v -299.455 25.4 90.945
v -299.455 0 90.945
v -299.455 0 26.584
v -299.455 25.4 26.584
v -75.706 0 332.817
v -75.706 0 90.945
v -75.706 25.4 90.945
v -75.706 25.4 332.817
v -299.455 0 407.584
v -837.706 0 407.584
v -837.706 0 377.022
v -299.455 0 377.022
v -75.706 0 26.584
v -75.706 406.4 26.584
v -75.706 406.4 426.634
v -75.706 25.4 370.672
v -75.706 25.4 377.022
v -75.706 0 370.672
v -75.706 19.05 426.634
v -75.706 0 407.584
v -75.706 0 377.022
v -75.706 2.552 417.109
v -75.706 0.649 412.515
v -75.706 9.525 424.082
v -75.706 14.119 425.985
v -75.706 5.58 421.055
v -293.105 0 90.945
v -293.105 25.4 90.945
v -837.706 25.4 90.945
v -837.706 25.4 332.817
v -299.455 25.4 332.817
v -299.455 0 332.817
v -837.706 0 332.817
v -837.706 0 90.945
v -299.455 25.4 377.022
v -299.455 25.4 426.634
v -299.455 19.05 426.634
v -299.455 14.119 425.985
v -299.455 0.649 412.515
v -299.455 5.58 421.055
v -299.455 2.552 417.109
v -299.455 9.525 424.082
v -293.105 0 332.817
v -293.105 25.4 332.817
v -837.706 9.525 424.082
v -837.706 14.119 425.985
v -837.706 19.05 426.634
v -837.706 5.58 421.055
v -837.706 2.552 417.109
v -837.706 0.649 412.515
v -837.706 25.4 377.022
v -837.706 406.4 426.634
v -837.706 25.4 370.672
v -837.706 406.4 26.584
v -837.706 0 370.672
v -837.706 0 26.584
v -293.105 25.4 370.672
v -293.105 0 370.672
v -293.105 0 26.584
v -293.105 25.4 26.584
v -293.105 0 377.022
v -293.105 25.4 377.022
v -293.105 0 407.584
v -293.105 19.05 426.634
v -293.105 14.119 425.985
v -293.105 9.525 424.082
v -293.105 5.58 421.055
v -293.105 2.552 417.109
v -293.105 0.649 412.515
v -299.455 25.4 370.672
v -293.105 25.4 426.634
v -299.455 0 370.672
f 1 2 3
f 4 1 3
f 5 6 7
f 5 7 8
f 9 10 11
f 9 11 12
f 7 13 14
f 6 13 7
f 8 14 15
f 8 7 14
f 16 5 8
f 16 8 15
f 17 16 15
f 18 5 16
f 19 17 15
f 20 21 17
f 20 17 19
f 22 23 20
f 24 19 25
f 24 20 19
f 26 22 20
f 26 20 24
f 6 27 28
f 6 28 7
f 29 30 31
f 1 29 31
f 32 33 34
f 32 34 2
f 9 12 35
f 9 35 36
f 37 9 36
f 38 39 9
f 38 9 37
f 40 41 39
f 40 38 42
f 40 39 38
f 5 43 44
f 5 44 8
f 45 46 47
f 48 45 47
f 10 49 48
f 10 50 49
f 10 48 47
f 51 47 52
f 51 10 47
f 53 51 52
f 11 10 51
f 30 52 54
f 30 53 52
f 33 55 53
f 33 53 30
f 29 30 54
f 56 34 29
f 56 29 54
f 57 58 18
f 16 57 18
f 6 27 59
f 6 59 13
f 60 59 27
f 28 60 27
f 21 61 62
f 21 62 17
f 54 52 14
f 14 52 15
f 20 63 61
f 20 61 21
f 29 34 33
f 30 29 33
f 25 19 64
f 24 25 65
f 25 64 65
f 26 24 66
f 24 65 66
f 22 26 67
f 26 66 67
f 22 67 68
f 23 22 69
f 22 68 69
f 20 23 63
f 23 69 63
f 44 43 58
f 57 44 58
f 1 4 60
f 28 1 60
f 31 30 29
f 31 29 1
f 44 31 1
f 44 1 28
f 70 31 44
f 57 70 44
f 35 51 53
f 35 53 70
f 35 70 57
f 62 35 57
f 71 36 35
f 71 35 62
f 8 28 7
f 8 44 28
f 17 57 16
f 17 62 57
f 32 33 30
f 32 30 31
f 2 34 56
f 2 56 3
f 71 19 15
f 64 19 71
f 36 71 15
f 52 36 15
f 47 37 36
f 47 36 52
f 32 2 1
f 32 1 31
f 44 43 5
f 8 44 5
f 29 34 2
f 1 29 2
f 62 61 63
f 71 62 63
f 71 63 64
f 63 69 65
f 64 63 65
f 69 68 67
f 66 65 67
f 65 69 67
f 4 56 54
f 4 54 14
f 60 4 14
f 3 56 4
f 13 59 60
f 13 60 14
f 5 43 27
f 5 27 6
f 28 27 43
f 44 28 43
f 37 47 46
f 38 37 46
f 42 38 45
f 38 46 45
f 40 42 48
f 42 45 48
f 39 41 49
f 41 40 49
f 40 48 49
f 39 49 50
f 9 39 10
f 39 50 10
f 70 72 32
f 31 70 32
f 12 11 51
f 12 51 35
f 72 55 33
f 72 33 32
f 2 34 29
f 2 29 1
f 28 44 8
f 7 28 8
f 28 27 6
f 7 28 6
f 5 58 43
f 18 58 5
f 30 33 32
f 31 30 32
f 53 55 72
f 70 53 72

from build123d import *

# Parameters (mm, degrees)
F0_W     = 6.35
F0_H     = 49.6119248599
F0_W_2   = 217.3990383744
F0_W_3   = 538.2509616256
F0_H_2   = 6.3500106335
F0_H_3   = 37.8549993038
F0_H_4   = 241.8718934059
F0_H_5   = 64.3611717969
F1_DEPTH = 406.4
F2_R     = 19.05
F3_DEPTH = 25.4
F4_DEPTH = 25.4


with BuildPart() as f1:
    # F0 (on Front) → F1 (new body)
    with BuildSketch(Plane.XZ):
        with Locations((-296.2797081947, 401.8281990156)):
            Rectangle(F0_W, F0_H)
        with Locations((-184.4051890075, 401.8281990156)):
            Rectangle(F0_W_2, F0_H)
        with Locations((-568.5801890075, 401.8281990156)):
            Rectangle(F0_W_3, F0_H)
        with Locations((-184.4051890075, 373.8472312689)):
            Rectangle(F0_W_2, F0_H_2)
        with Locations((-568.5801890075, 373.8472312689)):
            Rectangle(F0_W_3, F0_H_2)
        with Locations((-184.4051890075, 351.7447263002)):
            Rectangle(F0_W_2, F0_H_3)
        with Locations((-568.5801890075, 351.7447263002)):
            Rectangle(F0_W_3, F0_H_3)
        with Locations((-184.4051890075, 211.8812799454)):
            Rectangle(F0_W_2, F0_H_4)
        with Locations((-568.5801890075, 211.8812799454)):
            Rectangle(F0_W_3, F0_H_4)
        with Locations((-296.2797081947, 58.764747344)):
            Rectangle(F0_W, F0_H_5)
        with Locations((-184.4051890075, 58.764747344)):
            Rectangle(F0_W_2, F0_H_5)
        with Locations((-568.5801890075, 58.764747344)):
            Rectangle(F0_W_3, F0_H_5)
        with Locations((-296.2797081947, 351.7447263002)):
            Rectangle(F0_W, F0_H_3)
        with Locations((-296.2797081947, 373.8472312689)):
            Rectangle(F0_W, F0_H_2)
        with Locations((-296.2797081947, 211.8812799454)):
            Rectangle(F0_W, F0_H_4)
    extrude(amount=-F1_DEPTH)

    # F2
    f2_edges = [f1.edges().sort_by_distance(p)[0] for p in [
        (-456.70567, 0, 426.634161),
    ]]
    fillet(f2_edges, radius=F2_R)

    # F0 (on Front) → F3 (cut)
    with BuildSketch(Plane.XZ):
        with Locations((-568.5801890075, 373.8472312689)):
            Rectangle(F0_W_3, F0_H_2)
        with Locations((-296.2797081947, 401.8281990156)):
            Rectangle(F0_W, F0_H)
        with Locations((-296.2797081947, 373.8472312689)):
            Rectangle(F0_W, F0_H_2)
        with Locations((-184.4051890075, 373.8472312689)):
            Rectangle(F0_W_2, F0_H_2)
        with Locations((-296.2797081947, 351.7447263002)):
            Rectangle(F0_W, F0_H_3)
        with Locations((-296.2797081947, 211.8812799454)):
            Rectangle(F0_W, F0_H_4)
        with Locations((-296.2797081947, 58.764747344)):
            Rectangle(F0_W, F0_H_5)
        with Locations((-568.5801890075, 211.8812799454)):
            Rectangle(F0_W_3, F0_H_4)
        with Locations((-184.4051890075, 211.8812799454)):
            Rectangle(F0_W_2, F0_H_4)
    extrude(amount=-F3_DEPTH, mode=Mode.SUBTRACT)


with BuildPart() as f4:
    # F0 (on Front) → F4 (new body)
    with BuildSketch(Plane.XZ):
        with Locations((-568.5801890075, 211.8812799454)):
            Rectangle(F0_W_3, F0_H_4)
    extrude(amount=-F4_DEPTH)


with BuildPart() as f4b:
    # F0 (on Front) → F4, piece 2 (new body)
    with BuildSketch(Plane.XZ):
        with Locations((-184.4051890075, 211.8812799454)):
            Rectangle(F0_W_2, F0_H_4)
    extrude(amount=-F4_DEPTH)


solid = Compound([f1.part, f4.part, f4b.part])
